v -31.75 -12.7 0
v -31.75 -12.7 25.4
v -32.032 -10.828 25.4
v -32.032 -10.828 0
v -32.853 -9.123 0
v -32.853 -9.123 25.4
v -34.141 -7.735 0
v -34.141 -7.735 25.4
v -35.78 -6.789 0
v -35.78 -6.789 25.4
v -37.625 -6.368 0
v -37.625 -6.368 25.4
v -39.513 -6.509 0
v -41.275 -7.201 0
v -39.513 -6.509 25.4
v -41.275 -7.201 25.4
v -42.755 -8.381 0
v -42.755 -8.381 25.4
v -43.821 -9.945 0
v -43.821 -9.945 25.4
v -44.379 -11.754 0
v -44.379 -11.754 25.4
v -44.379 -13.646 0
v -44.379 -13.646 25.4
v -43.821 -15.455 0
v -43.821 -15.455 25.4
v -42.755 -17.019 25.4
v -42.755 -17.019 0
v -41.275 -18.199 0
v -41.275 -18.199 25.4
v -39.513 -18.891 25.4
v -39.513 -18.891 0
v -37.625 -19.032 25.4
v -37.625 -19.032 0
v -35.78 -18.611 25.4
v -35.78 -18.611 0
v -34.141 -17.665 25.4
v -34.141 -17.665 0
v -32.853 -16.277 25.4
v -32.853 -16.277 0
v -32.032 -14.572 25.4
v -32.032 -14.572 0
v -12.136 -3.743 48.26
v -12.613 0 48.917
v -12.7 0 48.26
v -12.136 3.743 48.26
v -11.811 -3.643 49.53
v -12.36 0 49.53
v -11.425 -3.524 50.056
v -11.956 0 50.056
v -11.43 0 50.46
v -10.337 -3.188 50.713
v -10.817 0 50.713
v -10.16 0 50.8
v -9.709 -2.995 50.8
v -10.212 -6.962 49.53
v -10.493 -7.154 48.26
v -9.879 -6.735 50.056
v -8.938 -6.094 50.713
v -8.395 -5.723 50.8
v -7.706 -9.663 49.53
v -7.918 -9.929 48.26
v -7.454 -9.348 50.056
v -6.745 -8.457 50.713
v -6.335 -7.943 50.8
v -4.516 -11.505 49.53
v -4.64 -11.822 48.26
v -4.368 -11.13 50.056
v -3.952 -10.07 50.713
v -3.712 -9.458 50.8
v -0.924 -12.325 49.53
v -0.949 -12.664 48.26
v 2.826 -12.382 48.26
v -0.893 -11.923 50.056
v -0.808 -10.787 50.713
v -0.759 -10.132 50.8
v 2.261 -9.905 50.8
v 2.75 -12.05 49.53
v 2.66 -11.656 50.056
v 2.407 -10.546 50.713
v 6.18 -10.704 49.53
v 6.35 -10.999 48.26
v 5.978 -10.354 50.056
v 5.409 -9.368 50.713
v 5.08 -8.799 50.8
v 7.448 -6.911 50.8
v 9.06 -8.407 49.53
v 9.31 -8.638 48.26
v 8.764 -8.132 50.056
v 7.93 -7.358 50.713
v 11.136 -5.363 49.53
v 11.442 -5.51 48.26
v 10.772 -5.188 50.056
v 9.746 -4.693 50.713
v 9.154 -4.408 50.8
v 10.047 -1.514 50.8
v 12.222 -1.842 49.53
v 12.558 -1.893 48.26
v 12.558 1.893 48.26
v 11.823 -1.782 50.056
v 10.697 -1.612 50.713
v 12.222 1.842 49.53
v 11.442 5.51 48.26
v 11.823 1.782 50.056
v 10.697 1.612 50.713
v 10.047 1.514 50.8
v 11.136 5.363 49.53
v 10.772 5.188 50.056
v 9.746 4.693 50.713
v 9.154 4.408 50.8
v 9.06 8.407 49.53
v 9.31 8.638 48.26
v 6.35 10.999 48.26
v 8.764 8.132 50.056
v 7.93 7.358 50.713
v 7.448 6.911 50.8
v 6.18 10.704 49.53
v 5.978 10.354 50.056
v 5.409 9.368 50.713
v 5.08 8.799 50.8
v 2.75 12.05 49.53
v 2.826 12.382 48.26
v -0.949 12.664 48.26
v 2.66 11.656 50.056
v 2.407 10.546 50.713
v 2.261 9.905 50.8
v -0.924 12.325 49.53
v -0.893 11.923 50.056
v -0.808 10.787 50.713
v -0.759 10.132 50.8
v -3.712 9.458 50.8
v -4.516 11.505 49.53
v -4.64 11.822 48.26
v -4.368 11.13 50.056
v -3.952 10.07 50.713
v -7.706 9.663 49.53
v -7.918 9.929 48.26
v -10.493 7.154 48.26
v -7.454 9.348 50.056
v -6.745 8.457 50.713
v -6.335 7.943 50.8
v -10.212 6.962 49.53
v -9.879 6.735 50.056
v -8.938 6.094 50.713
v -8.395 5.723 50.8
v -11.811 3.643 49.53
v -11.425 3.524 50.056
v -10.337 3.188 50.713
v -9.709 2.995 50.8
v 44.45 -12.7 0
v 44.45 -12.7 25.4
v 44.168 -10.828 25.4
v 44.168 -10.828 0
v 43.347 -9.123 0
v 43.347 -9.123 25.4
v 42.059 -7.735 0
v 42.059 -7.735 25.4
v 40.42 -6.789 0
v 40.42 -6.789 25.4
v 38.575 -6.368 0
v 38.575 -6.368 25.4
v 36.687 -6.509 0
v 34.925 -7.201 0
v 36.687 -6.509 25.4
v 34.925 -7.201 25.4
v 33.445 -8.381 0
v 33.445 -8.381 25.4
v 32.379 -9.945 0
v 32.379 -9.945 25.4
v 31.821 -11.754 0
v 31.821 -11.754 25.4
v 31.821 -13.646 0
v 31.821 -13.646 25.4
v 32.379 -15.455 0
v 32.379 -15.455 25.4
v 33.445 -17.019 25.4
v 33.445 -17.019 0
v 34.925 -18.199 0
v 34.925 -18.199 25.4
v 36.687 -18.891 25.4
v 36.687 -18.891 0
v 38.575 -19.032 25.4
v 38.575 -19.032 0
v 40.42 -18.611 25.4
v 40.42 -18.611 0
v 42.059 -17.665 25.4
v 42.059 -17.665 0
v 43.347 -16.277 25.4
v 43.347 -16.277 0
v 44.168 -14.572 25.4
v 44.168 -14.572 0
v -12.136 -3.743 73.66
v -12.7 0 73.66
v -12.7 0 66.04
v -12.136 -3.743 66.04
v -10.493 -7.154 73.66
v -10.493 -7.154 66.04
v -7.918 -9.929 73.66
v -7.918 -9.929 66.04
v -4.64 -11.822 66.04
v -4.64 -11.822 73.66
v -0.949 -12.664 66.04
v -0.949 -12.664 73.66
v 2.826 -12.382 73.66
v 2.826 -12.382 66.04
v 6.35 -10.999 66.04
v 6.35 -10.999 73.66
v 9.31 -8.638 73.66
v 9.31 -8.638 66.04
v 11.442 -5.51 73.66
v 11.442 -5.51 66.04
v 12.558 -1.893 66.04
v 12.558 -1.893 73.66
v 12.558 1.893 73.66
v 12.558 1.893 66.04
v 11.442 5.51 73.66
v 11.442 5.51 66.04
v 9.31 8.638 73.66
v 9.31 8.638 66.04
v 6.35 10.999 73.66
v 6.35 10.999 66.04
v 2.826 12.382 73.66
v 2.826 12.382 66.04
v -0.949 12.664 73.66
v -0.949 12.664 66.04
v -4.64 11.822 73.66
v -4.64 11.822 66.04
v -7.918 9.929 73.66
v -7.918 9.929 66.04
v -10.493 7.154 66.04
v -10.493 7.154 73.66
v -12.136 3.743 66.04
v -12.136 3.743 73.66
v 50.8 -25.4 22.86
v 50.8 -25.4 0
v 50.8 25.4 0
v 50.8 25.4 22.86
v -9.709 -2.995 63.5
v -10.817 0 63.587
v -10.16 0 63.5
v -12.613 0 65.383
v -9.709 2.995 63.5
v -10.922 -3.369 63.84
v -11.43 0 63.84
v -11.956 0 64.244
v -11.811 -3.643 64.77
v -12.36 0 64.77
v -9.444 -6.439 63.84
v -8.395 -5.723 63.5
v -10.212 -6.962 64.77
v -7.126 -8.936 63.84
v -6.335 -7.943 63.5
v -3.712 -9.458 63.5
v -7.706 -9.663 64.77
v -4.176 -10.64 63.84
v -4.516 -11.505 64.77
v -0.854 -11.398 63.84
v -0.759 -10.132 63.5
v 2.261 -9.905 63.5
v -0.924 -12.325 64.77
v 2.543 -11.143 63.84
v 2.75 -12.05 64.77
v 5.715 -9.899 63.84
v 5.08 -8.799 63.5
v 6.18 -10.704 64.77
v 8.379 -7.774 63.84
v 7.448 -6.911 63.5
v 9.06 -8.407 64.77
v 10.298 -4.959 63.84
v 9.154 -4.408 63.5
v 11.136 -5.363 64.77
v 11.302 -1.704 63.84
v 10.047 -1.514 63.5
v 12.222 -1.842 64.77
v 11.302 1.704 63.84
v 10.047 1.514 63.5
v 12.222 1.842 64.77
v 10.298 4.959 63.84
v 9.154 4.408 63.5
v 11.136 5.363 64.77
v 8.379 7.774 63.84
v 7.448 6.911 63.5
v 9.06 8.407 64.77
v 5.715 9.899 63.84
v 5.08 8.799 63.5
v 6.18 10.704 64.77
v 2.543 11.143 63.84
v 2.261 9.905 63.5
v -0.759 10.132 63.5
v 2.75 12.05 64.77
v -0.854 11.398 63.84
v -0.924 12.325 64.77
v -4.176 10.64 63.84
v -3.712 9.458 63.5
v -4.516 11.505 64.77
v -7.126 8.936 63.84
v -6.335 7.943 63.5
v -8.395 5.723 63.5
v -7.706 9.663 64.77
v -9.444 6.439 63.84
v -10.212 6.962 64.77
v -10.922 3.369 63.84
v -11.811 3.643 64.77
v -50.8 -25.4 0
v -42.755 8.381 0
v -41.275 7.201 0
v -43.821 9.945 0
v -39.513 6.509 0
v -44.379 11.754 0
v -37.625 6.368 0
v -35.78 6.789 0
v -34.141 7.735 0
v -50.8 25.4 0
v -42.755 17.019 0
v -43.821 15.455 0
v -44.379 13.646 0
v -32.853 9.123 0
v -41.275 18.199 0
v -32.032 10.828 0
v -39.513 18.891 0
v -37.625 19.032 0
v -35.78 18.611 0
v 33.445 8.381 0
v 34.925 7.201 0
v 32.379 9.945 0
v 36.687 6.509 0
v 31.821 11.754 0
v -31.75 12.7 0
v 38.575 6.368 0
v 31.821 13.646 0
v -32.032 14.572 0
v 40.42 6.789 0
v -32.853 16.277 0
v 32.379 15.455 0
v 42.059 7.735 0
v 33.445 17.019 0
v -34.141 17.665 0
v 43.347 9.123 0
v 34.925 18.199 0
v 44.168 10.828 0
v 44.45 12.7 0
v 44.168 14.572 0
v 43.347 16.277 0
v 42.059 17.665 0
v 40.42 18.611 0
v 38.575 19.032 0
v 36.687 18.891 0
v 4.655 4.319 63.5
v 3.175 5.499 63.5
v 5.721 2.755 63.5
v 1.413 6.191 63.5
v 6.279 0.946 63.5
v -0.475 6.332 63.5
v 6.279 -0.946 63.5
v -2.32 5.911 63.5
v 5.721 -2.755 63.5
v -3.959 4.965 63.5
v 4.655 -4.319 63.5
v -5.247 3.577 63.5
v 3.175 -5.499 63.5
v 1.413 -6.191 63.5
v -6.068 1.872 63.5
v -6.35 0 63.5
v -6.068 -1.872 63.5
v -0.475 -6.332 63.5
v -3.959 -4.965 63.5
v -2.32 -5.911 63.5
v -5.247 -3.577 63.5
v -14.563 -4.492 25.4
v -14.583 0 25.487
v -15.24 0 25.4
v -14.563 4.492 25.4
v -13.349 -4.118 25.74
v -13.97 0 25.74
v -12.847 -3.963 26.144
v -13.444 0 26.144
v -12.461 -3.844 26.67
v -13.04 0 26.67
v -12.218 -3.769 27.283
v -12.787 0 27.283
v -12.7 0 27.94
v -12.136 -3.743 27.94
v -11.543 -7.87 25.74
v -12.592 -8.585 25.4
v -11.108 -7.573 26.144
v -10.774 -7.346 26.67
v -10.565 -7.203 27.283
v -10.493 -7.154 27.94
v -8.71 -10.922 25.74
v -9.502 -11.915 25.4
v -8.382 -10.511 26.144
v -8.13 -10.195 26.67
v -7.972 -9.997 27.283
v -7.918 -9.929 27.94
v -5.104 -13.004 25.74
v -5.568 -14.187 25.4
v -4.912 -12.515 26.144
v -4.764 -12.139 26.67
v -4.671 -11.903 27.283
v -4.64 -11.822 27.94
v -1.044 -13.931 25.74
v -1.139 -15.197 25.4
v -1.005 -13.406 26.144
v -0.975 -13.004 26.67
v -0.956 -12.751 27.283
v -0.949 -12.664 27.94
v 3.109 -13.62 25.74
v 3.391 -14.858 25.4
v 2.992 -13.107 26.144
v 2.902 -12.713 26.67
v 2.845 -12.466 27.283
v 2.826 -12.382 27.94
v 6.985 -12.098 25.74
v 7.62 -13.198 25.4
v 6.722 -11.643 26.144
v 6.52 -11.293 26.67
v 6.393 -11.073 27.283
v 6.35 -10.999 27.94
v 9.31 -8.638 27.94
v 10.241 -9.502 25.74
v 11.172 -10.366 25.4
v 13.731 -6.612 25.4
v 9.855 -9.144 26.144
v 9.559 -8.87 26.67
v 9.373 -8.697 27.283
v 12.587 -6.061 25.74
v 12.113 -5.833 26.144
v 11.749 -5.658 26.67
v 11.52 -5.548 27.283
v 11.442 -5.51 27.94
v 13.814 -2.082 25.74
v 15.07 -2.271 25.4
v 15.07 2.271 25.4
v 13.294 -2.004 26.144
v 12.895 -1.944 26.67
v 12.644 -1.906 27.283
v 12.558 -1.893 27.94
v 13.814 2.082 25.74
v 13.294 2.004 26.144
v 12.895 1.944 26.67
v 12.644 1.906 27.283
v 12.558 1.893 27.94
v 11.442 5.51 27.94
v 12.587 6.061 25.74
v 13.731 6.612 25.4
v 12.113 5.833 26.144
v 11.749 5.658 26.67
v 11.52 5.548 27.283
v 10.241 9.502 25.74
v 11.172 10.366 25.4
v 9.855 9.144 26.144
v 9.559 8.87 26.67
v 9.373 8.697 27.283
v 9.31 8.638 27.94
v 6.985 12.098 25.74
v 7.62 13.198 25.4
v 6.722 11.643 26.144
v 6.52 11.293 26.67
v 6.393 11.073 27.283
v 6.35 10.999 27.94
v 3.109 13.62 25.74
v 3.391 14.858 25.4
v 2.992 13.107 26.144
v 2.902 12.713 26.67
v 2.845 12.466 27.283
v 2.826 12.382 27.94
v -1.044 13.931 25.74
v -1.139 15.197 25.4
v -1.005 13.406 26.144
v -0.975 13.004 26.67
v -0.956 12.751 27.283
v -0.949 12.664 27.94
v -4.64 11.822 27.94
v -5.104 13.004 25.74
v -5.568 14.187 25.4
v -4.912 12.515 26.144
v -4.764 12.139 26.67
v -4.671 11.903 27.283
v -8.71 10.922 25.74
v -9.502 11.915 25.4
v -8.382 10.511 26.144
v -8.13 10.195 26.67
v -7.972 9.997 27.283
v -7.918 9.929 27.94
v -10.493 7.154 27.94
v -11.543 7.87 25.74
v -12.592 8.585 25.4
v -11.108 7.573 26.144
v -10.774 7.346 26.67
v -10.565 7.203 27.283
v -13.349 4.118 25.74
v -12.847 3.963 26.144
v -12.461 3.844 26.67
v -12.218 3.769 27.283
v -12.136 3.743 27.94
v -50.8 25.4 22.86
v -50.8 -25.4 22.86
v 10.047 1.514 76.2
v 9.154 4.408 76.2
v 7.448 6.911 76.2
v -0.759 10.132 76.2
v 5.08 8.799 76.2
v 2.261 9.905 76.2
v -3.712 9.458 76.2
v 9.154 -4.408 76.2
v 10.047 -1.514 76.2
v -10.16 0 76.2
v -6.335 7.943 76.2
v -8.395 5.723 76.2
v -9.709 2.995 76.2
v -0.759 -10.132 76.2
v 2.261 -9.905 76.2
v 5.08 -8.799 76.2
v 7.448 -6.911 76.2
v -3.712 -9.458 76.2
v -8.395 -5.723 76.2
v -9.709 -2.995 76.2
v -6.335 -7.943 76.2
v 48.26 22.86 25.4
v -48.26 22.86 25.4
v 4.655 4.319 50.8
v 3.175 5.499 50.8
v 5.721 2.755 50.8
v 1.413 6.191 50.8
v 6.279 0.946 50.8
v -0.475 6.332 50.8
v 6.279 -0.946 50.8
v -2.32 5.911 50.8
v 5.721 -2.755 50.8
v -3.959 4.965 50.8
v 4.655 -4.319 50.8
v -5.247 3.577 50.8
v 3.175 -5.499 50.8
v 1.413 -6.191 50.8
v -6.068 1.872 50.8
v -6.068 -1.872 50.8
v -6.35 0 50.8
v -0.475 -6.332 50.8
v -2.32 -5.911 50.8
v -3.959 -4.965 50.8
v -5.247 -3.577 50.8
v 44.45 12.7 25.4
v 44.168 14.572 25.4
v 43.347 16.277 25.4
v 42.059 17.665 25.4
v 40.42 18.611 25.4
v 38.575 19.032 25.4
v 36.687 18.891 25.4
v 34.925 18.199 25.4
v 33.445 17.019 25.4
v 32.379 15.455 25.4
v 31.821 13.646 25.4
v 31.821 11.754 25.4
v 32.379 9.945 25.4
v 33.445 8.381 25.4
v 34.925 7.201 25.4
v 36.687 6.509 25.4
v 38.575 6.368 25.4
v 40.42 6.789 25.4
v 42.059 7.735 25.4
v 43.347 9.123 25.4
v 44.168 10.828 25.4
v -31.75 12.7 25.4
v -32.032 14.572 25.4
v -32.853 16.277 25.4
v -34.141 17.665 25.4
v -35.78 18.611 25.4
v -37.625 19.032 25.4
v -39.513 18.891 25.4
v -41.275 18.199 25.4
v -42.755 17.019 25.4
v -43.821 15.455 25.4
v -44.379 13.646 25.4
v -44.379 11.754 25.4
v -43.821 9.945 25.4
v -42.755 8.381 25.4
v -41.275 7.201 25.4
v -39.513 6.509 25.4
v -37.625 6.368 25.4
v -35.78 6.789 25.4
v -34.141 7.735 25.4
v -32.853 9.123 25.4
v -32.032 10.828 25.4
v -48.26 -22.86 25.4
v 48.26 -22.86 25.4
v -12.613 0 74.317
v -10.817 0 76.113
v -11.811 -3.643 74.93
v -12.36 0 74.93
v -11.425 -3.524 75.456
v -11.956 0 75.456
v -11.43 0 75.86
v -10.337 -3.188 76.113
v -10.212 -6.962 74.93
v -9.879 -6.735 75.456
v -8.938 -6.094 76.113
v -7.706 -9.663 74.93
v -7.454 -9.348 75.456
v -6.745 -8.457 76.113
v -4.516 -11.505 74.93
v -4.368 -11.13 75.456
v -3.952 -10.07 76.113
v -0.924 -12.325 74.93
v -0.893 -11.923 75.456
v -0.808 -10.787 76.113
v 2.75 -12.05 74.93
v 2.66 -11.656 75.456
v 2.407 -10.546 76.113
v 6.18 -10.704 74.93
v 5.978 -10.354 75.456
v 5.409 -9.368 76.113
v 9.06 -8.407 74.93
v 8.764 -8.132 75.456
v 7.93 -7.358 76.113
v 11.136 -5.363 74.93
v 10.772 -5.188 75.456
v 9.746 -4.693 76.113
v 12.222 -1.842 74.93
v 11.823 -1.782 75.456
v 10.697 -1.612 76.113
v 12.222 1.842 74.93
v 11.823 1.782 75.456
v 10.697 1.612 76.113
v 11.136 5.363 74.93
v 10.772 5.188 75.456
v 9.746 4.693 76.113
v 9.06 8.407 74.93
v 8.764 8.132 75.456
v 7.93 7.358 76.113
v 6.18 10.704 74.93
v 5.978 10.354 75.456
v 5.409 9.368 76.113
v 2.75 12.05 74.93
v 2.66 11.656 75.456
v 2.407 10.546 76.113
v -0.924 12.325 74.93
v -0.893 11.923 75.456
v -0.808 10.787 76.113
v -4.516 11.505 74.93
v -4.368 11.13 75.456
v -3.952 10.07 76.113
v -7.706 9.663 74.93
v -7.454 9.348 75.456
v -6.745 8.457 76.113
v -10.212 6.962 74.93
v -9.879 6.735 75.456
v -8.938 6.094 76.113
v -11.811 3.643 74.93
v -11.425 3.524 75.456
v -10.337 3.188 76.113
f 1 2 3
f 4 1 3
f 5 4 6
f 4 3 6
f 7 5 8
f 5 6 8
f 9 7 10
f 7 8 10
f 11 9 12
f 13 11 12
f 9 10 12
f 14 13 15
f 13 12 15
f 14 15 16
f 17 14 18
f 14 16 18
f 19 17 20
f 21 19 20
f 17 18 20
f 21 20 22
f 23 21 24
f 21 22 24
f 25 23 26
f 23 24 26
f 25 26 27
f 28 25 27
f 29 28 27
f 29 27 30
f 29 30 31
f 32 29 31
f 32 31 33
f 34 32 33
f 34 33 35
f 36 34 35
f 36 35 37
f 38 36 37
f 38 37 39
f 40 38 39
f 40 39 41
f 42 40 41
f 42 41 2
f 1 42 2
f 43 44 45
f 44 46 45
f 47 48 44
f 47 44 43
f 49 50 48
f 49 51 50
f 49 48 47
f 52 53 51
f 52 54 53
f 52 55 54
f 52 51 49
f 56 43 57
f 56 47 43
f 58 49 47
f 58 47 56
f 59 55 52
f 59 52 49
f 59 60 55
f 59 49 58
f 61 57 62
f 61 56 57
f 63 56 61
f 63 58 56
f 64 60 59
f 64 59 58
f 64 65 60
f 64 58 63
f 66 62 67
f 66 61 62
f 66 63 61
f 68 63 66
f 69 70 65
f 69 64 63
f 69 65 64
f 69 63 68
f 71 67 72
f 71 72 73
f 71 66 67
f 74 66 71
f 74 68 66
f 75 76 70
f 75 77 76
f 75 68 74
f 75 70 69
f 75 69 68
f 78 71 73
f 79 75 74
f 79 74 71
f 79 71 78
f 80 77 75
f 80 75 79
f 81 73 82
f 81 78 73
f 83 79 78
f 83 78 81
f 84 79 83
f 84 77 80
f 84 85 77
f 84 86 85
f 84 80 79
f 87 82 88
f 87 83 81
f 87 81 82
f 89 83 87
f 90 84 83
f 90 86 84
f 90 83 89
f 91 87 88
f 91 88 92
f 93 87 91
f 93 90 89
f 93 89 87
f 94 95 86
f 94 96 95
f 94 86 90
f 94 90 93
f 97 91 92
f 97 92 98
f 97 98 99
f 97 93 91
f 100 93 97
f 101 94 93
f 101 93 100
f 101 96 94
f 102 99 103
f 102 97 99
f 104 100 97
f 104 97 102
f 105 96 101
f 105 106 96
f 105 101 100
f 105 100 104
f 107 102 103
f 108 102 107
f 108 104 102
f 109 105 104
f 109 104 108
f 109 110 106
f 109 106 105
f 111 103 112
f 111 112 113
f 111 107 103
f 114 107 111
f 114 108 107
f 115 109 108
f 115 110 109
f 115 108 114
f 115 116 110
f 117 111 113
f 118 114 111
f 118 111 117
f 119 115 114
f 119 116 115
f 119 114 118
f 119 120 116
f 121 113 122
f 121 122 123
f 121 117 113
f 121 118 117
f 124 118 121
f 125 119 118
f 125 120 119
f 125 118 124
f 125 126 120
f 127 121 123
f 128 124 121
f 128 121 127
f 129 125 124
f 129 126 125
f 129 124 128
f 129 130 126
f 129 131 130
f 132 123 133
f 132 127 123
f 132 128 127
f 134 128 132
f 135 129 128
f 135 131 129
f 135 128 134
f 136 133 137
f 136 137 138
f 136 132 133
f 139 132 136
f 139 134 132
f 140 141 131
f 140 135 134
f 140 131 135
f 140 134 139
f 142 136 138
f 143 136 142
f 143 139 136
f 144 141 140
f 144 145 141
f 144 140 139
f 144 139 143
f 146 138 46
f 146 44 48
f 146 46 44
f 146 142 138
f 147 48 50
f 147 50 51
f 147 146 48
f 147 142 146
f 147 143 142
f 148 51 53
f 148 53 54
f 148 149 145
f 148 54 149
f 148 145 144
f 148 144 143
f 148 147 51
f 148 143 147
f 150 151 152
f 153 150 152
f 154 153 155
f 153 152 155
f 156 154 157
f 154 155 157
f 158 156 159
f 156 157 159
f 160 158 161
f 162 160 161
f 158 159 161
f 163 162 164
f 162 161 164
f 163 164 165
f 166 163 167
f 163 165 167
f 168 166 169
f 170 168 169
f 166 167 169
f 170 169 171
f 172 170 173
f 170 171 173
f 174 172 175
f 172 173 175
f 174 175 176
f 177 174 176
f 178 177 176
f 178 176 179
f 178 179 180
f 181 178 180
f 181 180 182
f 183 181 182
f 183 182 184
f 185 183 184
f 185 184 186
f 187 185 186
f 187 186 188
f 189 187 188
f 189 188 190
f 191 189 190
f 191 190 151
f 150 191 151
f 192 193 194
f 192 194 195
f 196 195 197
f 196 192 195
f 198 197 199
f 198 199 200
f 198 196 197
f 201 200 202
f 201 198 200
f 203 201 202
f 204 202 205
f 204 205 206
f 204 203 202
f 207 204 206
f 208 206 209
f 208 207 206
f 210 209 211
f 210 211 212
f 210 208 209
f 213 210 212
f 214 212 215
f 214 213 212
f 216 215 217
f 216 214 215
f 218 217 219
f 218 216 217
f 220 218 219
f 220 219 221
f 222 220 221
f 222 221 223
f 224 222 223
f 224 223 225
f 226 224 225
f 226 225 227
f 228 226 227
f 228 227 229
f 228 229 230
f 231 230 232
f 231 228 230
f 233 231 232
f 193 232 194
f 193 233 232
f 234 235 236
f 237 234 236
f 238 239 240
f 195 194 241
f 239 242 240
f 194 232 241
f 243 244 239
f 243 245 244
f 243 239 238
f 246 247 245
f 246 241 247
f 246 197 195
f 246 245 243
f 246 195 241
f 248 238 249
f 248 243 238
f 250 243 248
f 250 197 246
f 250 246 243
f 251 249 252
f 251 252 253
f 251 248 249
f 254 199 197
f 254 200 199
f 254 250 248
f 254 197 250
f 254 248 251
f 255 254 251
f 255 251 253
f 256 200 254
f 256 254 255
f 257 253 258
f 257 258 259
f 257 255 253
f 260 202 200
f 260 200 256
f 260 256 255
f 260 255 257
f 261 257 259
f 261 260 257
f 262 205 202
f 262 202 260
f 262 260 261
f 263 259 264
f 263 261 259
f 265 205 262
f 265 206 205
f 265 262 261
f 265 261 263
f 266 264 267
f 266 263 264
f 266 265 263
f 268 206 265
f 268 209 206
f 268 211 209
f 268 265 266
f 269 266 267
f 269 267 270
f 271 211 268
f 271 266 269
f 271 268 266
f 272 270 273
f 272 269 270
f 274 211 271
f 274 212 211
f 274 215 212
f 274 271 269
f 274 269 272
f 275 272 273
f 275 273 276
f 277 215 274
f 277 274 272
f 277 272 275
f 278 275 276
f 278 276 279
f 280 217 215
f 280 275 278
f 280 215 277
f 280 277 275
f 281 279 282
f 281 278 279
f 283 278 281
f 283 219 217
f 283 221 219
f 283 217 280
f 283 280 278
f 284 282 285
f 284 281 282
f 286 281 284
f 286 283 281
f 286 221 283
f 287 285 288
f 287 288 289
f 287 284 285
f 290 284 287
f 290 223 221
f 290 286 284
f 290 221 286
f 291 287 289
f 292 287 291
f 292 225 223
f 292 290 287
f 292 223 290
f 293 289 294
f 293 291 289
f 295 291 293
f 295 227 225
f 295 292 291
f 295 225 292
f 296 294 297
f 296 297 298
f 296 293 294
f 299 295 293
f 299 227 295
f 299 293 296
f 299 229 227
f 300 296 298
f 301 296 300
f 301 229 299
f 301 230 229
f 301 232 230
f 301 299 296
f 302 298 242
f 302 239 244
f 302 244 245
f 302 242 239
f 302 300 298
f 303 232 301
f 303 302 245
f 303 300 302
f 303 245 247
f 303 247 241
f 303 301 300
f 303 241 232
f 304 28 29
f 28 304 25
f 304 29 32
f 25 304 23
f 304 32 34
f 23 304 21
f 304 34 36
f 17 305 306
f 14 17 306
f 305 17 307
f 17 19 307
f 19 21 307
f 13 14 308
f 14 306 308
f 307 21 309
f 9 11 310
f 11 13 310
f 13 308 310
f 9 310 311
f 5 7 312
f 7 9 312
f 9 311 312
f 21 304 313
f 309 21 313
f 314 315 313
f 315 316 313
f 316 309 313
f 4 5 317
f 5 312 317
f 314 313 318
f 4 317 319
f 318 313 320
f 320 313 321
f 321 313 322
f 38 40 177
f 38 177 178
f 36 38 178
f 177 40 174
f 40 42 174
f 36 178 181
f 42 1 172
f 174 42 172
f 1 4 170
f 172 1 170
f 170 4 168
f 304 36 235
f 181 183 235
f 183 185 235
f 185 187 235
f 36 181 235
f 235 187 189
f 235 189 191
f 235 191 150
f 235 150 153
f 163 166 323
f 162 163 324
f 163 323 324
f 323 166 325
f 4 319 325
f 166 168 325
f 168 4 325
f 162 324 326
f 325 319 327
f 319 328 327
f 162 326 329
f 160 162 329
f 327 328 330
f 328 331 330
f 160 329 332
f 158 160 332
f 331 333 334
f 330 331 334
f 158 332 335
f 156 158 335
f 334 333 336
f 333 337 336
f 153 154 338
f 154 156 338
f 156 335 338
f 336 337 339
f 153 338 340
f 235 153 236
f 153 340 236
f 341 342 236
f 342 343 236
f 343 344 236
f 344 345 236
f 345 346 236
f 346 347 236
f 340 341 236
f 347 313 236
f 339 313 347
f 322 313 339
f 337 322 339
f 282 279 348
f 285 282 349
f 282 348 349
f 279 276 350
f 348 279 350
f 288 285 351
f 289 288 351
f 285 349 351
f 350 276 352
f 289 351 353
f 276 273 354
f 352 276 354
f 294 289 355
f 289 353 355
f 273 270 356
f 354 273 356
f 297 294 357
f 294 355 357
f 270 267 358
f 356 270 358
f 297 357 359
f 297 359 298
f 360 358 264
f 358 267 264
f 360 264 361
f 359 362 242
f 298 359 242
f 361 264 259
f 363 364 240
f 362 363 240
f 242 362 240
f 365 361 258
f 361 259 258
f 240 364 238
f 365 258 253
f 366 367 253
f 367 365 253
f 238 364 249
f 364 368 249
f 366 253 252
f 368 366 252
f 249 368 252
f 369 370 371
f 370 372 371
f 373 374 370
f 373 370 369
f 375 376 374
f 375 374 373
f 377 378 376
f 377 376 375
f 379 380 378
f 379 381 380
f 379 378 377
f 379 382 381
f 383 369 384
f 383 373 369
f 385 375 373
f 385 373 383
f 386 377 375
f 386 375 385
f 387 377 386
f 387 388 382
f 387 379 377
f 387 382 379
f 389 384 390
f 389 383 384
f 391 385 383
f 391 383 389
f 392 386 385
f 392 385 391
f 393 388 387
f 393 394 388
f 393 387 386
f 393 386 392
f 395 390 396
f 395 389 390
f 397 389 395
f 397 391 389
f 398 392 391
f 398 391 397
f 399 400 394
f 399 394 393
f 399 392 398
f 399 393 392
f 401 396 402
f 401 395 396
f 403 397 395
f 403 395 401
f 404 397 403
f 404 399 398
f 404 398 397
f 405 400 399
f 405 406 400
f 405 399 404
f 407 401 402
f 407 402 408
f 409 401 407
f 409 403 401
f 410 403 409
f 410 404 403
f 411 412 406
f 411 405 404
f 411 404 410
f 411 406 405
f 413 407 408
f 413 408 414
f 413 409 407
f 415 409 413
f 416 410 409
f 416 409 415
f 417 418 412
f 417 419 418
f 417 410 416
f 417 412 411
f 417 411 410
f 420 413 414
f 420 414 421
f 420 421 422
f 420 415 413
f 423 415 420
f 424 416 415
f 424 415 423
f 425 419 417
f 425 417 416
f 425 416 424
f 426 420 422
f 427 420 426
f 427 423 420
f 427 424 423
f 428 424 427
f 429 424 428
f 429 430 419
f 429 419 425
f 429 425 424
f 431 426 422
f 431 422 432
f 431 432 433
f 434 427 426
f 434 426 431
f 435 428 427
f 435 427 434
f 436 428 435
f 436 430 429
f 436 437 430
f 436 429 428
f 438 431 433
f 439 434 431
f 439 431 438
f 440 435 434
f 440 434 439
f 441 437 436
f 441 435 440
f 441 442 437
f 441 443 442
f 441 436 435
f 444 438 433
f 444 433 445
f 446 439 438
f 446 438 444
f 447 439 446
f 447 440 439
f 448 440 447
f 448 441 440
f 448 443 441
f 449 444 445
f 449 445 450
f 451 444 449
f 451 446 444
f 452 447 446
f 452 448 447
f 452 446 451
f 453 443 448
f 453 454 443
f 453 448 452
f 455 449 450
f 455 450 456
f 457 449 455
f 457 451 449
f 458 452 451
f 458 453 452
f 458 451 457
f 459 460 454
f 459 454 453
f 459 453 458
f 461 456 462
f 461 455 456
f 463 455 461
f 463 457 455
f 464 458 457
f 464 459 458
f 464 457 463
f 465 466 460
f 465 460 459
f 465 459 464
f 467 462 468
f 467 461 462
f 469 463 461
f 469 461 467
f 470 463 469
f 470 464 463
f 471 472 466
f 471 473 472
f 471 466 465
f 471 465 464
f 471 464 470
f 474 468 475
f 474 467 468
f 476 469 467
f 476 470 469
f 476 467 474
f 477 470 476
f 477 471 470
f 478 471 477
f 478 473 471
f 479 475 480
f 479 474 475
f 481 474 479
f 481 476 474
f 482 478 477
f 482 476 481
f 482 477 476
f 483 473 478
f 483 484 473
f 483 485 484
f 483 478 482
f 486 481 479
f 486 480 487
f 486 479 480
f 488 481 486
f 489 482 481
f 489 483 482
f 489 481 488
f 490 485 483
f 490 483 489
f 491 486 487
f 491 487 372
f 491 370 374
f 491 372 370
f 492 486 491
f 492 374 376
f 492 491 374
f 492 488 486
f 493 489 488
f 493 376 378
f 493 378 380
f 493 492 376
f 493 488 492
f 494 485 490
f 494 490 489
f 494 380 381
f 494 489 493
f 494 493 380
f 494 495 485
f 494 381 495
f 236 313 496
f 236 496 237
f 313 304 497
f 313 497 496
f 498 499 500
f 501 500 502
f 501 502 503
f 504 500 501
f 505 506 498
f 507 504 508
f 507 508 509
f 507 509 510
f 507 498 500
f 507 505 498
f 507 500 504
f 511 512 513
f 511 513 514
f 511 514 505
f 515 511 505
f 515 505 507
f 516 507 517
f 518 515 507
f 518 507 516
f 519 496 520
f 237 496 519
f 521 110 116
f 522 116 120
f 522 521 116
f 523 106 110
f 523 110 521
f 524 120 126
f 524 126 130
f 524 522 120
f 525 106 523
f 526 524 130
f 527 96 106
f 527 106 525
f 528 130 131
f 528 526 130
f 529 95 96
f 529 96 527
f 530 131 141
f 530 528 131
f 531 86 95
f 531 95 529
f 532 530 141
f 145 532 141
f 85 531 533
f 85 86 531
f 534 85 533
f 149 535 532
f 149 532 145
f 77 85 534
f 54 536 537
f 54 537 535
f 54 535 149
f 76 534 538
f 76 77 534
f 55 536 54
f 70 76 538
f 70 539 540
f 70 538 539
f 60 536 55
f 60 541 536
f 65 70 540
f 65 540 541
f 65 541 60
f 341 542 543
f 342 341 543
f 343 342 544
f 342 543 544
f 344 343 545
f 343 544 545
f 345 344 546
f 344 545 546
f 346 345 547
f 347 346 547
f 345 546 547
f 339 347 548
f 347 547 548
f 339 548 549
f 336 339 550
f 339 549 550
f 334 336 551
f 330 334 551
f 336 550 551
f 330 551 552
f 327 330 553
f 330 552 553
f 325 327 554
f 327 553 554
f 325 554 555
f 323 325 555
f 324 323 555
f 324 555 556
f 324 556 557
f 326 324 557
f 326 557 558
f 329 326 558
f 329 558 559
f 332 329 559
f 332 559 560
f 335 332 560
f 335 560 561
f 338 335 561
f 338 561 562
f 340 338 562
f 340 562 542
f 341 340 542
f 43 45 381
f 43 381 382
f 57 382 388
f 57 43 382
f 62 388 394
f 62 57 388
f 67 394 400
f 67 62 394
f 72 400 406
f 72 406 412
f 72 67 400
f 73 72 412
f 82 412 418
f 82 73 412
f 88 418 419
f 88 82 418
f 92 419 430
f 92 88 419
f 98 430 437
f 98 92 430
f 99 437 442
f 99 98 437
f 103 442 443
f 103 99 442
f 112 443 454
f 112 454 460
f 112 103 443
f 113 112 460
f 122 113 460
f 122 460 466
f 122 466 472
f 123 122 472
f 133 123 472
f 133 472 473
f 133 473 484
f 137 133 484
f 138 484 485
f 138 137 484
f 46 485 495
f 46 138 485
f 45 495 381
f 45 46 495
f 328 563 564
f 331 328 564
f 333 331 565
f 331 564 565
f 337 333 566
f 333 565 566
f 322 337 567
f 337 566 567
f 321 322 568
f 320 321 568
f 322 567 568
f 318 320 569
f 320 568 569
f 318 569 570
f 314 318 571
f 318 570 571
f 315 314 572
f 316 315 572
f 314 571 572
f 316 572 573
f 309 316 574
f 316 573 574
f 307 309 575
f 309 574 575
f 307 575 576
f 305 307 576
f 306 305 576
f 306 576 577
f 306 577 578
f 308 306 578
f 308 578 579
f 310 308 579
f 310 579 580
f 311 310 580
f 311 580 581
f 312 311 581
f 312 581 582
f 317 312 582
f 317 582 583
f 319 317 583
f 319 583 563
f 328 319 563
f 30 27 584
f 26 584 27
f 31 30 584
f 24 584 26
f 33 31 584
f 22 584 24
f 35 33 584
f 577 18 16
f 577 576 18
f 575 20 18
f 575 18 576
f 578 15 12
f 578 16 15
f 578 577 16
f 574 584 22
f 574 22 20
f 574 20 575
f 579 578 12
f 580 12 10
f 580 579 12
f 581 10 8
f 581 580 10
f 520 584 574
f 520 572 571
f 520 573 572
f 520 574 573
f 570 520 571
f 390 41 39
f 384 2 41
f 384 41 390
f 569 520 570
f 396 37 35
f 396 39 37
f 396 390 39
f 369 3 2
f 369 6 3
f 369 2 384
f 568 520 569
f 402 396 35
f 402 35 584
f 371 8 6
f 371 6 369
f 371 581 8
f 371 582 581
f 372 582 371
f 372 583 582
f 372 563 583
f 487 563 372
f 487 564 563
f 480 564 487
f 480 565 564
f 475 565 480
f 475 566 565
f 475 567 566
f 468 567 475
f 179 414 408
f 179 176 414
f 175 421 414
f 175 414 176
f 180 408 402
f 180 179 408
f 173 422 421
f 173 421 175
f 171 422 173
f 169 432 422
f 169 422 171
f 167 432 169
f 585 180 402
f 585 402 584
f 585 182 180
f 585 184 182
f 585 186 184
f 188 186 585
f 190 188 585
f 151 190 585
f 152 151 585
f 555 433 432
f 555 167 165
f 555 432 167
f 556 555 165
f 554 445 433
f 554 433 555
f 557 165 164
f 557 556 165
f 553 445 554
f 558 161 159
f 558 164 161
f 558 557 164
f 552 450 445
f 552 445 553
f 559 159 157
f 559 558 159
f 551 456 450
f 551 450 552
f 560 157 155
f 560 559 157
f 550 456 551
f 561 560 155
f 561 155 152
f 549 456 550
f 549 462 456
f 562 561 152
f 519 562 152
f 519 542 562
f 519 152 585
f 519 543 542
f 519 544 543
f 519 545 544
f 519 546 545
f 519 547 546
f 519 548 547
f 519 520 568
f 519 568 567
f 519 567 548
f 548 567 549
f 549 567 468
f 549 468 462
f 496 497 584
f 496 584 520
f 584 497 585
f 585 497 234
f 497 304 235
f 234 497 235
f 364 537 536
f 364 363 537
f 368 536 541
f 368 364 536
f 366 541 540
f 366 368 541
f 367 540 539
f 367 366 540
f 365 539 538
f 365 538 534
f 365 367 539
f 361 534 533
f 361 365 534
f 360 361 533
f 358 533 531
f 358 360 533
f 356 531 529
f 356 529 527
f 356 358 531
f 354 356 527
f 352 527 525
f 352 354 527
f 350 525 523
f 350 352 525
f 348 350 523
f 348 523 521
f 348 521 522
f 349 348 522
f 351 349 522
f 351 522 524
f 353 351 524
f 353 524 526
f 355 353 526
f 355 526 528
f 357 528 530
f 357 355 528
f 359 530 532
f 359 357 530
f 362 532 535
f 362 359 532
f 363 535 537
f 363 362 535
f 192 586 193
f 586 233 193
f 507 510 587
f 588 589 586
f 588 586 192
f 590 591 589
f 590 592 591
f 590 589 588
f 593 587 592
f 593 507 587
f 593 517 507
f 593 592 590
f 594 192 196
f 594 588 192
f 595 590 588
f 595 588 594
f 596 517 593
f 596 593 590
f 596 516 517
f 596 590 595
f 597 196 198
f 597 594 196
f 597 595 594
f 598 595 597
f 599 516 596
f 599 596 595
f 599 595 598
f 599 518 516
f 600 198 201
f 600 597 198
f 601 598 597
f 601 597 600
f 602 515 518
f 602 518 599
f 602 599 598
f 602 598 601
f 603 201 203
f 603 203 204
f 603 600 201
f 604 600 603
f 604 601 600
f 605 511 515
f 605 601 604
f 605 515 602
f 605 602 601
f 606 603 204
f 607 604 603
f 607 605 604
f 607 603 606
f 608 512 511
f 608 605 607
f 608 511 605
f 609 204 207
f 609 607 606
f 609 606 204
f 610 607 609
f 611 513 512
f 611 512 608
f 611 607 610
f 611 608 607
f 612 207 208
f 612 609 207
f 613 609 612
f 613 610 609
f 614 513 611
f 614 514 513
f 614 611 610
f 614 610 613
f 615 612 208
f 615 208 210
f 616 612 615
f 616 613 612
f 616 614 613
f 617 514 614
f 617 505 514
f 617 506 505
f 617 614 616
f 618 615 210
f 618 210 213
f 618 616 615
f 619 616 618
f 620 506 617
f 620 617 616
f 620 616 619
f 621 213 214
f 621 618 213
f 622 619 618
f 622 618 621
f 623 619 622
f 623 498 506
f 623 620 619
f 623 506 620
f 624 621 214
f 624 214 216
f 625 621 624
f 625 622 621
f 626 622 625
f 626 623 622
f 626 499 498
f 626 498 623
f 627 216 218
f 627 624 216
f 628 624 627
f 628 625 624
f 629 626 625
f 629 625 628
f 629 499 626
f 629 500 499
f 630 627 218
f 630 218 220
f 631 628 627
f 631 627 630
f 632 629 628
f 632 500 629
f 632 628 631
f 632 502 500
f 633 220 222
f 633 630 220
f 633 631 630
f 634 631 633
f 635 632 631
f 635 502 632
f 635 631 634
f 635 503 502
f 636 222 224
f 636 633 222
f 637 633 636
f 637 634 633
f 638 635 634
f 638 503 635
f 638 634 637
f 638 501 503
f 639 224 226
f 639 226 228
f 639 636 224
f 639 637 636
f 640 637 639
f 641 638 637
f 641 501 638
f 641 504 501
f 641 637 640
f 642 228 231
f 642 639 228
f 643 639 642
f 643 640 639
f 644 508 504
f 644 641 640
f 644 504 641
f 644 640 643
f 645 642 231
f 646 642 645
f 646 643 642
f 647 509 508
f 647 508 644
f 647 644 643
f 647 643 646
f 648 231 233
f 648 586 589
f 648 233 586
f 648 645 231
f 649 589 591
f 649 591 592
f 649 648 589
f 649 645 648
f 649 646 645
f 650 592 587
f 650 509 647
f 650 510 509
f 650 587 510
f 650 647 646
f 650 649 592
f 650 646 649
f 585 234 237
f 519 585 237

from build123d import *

# Parameters (mm, degrees)
F0_W     = 101.6
F0_H     = 50.8
F1_DEPTH = 25.4
F2_R     = 6.35
F3_DEPTH = 25.401
F4_W     = 12.7
F4_H     = 50.8
F6_W     = 18.9611997128
F6_H     = 12.7
F8_R     = 2.54
F9_SIZE  = 2.54


with BuildPart() as f1:
    # F0 (on Top) → F1 (new body)
    with BuildSketch(Plane.XY):
        Rectangle(F0_W, F0_H)
    extrude(amount=F1_DEPTH)

    # F2 (on face) → F3 (cut, through all)
    with BuildSketch(Plane.XY.offset(25.4)):
        with Locations((38.1, -12.7)):
            Circle(F2_R)
        with Locations((38.1, 12.7)):
            Circle(F2_R)
        with Locations((-38.1, 12.7)):
            Circle(F2_R)
        with Locations((-38.1, -12.7)):
            Circle(F2_R)
    extrude(amount=-F3_DEPTH, mode=Mode.SUBTRACT)

    # F4 (on Front) → F5 (revolve)
    with BuildSketch(Plane.XZ):
        with Locations((-6.35, 50.8)):
            Rectangle(F4_W, F4_H)
    revolve(axis=Axis((0, 0, 50.8), (0, 0, 1)))

    # F6 (on Front) → F7 (revolve, cut)
    with BuildSketch(Plane.XZ):
        with Locations((-15.8305998564, 57.15)):
            Rectangle(F6_W, F6_H)
    revolve(axis=Axis((0, 0, 46.6448366642), (0, 0, 1)), mode=Mode.SUBTRACT)

    # F8
    f8_edges = [f1.edges().sort_by_distance(p)[0] for p in [
        (12.7, 0, 50.8),
        (12.7, 0, 76.2),
        (12.7, 0, 25.4),
        (12.7, 0, 63.5),
    ]]
    fillet(f8_edges, radius=F8_R)

    # F9
    f9_edges = [f1.edges().sort_by_distance(p)[0] for p in [
        (0, 25.4, 25.4),
        (50.8, 0, 25.4),
        (0, -25.4, 25.4),
        (-50.8, 0, 25.4),
    ]]
    chamfer(f9_edges, length=F9_SIZE)


solid = f1.part
